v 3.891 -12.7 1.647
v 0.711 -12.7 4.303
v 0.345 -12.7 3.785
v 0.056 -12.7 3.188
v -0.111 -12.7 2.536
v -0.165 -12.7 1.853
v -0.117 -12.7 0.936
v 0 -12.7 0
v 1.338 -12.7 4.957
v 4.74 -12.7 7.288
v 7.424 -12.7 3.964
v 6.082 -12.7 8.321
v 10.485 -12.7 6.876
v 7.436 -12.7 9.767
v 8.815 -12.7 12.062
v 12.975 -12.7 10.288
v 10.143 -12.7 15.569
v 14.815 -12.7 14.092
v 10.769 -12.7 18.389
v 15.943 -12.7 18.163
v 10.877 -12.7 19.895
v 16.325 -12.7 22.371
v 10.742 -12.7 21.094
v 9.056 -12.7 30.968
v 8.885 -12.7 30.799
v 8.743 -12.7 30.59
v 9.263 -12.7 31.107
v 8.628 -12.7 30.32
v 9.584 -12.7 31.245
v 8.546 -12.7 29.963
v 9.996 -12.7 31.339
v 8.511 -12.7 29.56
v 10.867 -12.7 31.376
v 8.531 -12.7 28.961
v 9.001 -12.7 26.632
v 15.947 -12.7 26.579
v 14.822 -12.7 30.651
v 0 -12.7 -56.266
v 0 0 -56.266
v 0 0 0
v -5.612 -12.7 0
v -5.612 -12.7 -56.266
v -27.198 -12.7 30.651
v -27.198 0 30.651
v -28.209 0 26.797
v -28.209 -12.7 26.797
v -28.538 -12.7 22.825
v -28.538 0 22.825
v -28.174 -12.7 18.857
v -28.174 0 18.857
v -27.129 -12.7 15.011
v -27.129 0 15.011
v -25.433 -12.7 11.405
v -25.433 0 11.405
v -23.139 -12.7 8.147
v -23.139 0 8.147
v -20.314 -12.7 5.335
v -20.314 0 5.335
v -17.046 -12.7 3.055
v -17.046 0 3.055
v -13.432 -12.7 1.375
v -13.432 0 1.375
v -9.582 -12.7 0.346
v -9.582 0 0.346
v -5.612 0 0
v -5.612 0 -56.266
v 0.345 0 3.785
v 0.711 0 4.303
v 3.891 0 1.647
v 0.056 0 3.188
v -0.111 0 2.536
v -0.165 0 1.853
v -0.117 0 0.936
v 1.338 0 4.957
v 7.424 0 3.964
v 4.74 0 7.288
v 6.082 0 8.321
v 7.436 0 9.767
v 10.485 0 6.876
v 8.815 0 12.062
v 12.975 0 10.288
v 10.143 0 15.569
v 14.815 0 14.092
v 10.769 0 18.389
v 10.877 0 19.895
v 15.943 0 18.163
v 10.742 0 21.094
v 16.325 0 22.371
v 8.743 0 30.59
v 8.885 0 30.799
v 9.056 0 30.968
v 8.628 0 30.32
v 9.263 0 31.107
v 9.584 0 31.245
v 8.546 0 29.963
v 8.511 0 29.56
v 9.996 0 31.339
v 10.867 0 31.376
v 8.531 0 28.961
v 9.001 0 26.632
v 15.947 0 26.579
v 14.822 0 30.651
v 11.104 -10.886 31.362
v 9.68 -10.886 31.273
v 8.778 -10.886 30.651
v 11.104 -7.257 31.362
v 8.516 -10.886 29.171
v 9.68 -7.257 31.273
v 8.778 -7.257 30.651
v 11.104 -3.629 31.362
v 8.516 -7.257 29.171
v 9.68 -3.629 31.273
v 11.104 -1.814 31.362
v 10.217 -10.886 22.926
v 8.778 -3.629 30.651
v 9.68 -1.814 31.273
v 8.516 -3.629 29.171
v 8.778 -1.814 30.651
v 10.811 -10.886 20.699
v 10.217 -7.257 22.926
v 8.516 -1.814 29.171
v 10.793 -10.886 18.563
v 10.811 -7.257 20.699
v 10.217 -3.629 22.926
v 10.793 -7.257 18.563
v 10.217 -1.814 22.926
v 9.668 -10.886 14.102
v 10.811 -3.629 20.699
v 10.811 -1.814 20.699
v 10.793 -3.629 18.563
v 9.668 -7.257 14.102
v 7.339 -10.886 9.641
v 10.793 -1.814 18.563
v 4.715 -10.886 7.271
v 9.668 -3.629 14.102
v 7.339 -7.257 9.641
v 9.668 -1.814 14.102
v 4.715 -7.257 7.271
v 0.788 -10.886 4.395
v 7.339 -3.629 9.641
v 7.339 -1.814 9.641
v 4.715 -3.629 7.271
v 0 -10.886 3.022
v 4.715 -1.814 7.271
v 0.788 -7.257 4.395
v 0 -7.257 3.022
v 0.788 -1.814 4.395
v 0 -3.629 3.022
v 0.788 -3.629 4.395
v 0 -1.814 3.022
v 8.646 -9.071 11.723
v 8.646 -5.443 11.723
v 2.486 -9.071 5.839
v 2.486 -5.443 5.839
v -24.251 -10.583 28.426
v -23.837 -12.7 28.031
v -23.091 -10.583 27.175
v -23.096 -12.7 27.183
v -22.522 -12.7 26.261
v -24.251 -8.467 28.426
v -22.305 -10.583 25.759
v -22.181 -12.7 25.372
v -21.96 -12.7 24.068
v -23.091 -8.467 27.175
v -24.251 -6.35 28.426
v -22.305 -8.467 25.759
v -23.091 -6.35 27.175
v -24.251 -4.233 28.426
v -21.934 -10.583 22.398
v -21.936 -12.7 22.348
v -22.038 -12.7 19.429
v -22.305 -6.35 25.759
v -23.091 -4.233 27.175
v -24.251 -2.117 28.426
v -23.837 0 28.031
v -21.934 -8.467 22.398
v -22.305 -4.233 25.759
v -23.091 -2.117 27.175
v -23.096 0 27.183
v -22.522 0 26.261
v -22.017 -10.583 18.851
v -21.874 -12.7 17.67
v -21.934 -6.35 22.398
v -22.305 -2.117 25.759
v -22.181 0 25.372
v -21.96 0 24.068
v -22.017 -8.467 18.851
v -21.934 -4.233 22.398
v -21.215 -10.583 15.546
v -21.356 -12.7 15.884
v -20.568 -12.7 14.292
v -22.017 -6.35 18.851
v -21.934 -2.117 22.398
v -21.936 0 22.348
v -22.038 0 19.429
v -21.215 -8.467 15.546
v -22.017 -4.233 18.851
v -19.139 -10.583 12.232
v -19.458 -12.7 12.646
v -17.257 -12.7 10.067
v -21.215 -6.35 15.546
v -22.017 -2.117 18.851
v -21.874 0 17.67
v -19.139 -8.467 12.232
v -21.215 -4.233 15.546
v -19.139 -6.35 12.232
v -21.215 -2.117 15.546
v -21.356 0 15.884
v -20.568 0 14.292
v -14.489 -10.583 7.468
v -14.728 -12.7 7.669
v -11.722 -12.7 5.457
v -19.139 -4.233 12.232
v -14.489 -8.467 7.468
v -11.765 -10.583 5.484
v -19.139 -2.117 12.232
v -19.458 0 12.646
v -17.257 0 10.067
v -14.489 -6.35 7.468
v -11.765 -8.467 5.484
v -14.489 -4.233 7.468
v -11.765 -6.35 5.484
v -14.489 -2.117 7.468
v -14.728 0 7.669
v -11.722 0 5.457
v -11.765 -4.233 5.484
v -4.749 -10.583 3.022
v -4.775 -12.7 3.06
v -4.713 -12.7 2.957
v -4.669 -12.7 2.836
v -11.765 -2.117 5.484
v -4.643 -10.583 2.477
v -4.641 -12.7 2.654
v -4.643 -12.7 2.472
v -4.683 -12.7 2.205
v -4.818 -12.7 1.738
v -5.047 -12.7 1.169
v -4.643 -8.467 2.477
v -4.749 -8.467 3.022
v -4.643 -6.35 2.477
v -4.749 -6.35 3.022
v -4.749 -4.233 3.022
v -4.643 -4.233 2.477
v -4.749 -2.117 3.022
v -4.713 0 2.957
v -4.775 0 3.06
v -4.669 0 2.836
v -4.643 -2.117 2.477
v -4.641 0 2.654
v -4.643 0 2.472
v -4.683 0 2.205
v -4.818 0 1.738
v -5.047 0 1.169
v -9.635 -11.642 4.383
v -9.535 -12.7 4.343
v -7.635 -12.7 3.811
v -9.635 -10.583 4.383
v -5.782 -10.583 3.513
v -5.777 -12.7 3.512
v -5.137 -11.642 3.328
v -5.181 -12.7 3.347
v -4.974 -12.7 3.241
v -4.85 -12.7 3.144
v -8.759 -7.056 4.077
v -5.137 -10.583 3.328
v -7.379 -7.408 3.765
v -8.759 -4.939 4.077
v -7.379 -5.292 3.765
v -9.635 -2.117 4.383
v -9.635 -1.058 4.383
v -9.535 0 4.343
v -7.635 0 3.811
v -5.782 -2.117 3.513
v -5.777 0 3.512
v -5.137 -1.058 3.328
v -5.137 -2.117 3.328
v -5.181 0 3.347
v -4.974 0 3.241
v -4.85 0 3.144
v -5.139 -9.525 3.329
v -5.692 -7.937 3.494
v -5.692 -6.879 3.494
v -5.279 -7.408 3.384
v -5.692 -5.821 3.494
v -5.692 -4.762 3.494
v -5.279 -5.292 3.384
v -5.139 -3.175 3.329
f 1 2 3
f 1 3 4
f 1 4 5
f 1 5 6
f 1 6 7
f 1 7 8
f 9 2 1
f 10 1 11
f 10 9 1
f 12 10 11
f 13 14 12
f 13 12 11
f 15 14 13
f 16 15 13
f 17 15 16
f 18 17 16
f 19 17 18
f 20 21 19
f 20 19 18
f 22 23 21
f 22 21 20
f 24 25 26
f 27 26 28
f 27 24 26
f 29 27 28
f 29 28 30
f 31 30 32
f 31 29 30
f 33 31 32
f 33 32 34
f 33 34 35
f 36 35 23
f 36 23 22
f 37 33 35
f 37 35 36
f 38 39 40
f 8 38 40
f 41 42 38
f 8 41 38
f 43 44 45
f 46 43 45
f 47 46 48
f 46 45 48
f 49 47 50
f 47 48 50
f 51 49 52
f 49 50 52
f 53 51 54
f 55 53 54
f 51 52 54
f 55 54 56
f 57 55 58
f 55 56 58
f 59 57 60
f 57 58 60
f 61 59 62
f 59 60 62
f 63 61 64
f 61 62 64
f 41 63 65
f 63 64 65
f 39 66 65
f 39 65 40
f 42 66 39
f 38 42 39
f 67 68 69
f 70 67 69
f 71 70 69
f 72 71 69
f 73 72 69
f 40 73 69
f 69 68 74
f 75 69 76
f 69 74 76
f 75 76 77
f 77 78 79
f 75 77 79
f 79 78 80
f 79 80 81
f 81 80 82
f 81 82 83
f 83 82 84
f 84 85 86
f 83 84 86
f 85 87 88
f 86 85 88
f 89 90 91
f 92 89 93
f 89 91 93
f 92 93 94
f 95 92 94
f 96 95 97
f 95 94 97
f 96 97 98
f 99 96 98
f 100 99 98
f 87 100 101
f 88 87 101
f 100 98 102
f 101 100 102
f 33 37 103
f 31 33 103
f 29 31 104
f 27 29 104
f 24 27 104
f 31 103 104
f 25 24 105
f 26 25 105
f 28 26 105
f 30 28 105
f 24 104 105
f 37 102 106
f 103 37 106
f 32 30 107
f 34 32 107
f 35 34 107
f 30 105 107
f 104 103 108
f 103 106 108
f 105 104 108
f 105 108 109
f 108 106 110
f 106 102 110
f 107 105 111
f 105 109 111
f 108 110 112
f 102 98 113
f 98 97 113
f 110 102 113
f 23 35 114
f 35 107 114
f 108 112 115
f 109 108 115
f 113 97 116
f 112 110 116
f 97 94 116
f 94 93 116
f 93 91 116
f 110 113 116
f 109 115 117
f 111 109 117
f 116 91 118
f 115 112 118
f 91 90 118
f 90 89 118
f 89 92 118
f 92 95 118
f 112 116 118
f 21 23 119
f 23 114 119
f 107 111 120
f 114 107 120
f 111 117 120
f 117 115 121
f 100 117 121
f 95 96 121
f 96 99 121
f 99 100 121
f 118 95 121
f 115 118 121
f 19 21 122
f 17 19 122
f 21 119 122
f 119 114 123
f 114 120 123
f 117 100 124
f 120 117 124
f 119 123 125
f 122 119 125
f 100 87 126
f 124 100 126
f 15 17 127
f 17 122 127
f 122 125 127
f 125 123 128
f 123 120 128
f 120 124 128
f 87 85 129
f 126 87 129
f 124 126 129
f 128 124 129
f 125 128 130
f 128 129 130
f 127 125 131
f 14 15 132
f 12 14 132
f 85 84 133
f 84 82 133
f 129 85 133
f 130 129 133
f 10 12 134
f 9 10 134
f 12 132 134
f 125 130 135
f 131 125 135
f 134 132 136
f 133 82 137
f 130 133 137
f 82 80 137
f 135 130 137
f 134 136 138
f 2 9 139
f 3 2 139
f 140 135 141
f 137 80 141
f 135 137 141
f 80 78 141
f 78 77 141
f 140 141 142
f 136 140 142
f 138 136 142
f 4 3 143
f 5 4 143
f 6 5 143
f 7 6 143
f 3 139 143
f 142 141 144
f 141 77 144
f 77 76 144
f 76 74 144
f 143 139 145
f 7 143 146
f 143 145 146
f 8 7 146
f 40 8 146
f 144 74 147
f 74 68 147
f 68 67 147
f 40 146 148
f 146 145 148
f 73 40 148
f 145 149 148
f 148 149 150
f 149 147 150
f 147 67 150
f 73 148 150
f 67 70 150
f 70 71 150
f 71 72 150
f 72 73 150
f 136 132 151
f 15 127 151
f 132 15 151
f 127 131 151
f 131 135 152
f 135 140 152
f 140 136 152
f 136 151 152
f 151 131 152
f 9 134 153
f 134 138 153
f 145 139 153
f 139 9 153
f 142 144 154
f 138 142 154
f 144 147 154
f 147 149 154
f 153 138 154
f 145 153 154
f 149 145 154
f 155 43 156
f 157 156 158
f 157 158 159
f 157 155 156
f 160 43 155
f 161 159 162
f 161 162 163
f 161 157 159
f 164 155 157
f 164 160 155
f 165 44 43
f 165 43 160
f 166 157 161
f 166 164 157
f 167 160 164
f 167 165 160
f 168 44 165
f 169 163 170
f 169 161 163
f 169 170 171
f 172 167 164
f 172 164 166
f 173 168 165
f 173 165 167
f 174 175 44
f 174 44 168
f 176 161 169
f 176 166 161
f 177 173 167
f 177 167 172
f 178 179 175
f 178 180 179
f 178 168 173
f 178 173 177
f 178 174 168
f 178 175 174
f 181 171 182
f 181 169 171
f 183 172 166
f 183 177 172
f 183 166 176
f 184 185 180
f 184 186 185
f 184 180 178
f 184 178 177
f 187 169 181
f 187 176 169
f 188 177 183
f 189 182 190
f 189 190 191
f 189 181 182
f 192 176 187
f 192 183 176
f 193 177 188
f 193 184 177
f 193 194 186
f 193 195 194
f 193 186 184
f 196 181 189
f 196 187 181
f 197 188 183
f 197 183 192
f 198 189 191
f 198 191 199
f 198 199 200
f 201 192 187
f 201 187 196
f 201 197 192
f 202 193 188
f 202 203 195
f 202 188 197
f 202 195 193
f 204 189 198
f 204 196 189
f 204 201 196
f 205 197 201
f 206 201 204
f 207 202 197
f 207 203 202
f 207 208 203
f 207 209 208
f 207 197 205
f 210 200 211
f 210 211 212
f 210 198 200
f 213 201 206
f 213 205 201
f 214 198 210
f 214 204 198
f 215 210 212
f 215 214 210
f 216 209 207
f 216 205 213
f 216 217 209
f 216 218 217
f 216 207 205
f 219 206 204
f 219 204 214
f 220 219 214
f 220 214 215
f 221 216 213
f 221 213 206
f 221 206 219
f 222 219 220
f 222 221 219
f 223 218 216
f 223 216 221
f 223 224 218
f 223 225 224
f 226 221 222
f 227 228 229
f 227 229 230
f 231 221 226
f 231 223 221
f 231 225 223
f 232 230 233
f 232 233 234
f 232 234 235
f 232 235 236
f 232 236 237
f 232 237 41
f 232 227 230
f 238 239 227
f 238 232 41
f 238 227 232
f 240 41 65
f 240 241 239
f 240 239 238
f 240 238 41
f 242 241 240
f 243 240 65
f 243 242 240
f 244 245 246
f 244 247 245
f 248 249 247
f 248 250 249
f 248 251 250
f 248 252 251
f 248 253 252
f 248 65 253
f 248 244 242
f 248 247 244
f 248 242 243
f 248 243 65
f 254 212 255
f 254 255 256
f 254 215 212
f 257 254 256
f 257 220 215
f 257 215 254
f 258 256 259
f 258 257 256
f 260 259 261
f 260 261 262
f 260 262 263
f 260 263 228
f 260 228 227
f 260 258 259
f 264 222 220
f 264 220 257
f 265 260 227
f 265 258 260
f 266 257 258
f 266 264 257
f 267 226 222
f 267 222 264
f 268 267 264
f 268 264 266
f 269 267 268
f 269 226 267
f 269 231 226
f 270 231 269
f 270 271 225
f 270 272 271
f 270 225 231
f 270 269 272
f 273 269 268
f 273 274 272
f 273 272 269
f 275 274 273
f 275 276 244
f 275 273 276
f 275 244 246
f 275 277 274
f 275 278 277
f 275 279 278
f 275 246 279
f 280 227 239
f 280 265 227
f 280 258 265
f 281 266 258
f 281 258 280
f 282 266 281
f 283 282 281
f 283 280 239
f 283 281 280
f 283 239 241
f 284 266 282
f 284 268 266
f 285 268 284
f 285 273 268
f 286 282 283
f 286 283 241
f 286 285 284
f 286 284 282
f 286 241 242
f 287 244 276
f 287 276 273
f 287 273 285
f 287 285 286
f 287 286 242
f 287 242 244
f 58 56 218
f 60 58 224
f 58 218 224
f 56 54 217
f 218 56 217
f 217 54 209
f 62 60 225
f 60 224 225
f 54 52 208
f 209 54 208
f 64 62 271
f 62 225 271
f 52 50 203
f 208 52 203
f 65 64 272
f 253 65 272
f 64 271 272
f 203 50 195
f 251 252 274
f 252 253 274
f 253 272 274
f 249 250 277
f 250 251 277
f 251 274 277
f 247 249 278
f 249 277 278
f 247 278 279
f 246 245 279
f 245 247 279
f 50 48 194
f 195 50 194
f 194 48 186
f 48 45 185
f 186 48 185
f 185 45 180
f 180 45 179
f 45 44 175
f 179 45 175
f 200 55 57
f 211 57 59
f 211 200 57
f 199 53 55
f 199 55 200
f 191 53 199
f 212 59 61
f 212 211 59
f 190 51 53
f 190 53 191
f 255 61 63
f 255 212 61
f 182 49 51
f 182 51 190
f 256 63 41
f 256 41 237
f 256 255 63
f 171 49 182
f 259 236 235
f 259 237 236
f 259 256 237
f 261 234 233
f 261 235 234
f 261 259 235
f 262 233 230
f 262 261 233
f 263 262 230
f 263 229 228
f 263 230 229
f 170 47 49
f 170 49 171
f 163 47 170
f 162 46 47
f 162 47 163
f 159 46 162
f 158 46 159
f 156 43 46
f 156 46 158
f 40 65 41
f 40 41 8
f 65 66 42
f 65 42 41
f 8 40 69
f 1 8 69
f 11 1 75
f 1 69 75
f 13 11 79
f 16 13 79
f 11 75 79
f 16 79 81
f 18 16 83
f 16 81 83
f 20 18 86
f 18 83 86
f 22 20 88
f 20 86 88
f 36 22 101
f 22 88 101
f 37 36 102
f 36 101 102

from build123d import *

# Parameters (mm, degrees)
F1_DEPTH = 12.7
F0_W     = 5.6122136302
F0_H     = 56.2660247087


with BuildPart() as f1:
    # F0 (on Front) → F1 (new body)
    with BuildSketch(Plane.XZ):
        with BuildLine():
            add(Edge.make_bspline(
                [(14.821995981, 30.6513141841), (12.1889189933, 31.283159008), (6.5534916308, 32.6354611345), (10.5580563501, 22.3824570518), (11.2940908202, 18.85642848), (8.2609183428, 8.7428968869), (2.1684648523, 6.0179356006), (-0.4363118117, 3.2027177249), (-0.1427585983, 1.0479099604), (0, 0)],
                knots=[0, 0, 0, 0, 0.1481976866, 0.3171792174, 0.4436333366, 0.6300876375, 0.784517979, 0.8952083987, 1, 1, 1, 1], degree=3))
            ThreePointArc((0, 0), (13.9806169759, 12.1487993034), (14.821995981, 30.6513141841))
        make_face()
    extrude(amount=F1_DEPTH)


with BuildPart() as f1b:
    # F0 (on Front) → F1, piece 2 (new body)
    with BuildSketch(Plane.XZ):
        with Locations((-2.8061068151, -28.1330123544)):
            Rectangle(F0_W, F0_H)
    extrude(amount=F1_DEPTH)


with BuildPart() as f1c:
    # F0 (on Front) → F1, piece 3 (new body)
    with BuildSketch(Plane.XZ):
        with BuildLine():
            ThreePointArc((-27.1976441145, 30.6513141841), (-24.3567719766, 9.7257681112), (-5.6122136302, 0))
            add(Edge.make_bspline(
                [(-27.1976441145, 30.6513141841), (-25.1222087019, 29.2170224045), (-20.9722362609, 26.3490597007), (-22.7582250364, 18.4532976866), (-19.7724687707, 11.9382008659), (-10.1219424112, 3.111265905), (-3.6505446779, 3.8992051201), (-4.9977156073, 1.2214363868), (-5.6122136302, 0)],
                knots=[0, 0, 0, 0, 0.1705359553, 0.3409980915, 0.5151774254, 0.7480288767, 0.88506599, 1, 1, 1, 1], degree=3))
        make_face()
    extrude(amount=F1_DEPTH)


solid = Compound([f1.part, f1b.part, f1c.part])
